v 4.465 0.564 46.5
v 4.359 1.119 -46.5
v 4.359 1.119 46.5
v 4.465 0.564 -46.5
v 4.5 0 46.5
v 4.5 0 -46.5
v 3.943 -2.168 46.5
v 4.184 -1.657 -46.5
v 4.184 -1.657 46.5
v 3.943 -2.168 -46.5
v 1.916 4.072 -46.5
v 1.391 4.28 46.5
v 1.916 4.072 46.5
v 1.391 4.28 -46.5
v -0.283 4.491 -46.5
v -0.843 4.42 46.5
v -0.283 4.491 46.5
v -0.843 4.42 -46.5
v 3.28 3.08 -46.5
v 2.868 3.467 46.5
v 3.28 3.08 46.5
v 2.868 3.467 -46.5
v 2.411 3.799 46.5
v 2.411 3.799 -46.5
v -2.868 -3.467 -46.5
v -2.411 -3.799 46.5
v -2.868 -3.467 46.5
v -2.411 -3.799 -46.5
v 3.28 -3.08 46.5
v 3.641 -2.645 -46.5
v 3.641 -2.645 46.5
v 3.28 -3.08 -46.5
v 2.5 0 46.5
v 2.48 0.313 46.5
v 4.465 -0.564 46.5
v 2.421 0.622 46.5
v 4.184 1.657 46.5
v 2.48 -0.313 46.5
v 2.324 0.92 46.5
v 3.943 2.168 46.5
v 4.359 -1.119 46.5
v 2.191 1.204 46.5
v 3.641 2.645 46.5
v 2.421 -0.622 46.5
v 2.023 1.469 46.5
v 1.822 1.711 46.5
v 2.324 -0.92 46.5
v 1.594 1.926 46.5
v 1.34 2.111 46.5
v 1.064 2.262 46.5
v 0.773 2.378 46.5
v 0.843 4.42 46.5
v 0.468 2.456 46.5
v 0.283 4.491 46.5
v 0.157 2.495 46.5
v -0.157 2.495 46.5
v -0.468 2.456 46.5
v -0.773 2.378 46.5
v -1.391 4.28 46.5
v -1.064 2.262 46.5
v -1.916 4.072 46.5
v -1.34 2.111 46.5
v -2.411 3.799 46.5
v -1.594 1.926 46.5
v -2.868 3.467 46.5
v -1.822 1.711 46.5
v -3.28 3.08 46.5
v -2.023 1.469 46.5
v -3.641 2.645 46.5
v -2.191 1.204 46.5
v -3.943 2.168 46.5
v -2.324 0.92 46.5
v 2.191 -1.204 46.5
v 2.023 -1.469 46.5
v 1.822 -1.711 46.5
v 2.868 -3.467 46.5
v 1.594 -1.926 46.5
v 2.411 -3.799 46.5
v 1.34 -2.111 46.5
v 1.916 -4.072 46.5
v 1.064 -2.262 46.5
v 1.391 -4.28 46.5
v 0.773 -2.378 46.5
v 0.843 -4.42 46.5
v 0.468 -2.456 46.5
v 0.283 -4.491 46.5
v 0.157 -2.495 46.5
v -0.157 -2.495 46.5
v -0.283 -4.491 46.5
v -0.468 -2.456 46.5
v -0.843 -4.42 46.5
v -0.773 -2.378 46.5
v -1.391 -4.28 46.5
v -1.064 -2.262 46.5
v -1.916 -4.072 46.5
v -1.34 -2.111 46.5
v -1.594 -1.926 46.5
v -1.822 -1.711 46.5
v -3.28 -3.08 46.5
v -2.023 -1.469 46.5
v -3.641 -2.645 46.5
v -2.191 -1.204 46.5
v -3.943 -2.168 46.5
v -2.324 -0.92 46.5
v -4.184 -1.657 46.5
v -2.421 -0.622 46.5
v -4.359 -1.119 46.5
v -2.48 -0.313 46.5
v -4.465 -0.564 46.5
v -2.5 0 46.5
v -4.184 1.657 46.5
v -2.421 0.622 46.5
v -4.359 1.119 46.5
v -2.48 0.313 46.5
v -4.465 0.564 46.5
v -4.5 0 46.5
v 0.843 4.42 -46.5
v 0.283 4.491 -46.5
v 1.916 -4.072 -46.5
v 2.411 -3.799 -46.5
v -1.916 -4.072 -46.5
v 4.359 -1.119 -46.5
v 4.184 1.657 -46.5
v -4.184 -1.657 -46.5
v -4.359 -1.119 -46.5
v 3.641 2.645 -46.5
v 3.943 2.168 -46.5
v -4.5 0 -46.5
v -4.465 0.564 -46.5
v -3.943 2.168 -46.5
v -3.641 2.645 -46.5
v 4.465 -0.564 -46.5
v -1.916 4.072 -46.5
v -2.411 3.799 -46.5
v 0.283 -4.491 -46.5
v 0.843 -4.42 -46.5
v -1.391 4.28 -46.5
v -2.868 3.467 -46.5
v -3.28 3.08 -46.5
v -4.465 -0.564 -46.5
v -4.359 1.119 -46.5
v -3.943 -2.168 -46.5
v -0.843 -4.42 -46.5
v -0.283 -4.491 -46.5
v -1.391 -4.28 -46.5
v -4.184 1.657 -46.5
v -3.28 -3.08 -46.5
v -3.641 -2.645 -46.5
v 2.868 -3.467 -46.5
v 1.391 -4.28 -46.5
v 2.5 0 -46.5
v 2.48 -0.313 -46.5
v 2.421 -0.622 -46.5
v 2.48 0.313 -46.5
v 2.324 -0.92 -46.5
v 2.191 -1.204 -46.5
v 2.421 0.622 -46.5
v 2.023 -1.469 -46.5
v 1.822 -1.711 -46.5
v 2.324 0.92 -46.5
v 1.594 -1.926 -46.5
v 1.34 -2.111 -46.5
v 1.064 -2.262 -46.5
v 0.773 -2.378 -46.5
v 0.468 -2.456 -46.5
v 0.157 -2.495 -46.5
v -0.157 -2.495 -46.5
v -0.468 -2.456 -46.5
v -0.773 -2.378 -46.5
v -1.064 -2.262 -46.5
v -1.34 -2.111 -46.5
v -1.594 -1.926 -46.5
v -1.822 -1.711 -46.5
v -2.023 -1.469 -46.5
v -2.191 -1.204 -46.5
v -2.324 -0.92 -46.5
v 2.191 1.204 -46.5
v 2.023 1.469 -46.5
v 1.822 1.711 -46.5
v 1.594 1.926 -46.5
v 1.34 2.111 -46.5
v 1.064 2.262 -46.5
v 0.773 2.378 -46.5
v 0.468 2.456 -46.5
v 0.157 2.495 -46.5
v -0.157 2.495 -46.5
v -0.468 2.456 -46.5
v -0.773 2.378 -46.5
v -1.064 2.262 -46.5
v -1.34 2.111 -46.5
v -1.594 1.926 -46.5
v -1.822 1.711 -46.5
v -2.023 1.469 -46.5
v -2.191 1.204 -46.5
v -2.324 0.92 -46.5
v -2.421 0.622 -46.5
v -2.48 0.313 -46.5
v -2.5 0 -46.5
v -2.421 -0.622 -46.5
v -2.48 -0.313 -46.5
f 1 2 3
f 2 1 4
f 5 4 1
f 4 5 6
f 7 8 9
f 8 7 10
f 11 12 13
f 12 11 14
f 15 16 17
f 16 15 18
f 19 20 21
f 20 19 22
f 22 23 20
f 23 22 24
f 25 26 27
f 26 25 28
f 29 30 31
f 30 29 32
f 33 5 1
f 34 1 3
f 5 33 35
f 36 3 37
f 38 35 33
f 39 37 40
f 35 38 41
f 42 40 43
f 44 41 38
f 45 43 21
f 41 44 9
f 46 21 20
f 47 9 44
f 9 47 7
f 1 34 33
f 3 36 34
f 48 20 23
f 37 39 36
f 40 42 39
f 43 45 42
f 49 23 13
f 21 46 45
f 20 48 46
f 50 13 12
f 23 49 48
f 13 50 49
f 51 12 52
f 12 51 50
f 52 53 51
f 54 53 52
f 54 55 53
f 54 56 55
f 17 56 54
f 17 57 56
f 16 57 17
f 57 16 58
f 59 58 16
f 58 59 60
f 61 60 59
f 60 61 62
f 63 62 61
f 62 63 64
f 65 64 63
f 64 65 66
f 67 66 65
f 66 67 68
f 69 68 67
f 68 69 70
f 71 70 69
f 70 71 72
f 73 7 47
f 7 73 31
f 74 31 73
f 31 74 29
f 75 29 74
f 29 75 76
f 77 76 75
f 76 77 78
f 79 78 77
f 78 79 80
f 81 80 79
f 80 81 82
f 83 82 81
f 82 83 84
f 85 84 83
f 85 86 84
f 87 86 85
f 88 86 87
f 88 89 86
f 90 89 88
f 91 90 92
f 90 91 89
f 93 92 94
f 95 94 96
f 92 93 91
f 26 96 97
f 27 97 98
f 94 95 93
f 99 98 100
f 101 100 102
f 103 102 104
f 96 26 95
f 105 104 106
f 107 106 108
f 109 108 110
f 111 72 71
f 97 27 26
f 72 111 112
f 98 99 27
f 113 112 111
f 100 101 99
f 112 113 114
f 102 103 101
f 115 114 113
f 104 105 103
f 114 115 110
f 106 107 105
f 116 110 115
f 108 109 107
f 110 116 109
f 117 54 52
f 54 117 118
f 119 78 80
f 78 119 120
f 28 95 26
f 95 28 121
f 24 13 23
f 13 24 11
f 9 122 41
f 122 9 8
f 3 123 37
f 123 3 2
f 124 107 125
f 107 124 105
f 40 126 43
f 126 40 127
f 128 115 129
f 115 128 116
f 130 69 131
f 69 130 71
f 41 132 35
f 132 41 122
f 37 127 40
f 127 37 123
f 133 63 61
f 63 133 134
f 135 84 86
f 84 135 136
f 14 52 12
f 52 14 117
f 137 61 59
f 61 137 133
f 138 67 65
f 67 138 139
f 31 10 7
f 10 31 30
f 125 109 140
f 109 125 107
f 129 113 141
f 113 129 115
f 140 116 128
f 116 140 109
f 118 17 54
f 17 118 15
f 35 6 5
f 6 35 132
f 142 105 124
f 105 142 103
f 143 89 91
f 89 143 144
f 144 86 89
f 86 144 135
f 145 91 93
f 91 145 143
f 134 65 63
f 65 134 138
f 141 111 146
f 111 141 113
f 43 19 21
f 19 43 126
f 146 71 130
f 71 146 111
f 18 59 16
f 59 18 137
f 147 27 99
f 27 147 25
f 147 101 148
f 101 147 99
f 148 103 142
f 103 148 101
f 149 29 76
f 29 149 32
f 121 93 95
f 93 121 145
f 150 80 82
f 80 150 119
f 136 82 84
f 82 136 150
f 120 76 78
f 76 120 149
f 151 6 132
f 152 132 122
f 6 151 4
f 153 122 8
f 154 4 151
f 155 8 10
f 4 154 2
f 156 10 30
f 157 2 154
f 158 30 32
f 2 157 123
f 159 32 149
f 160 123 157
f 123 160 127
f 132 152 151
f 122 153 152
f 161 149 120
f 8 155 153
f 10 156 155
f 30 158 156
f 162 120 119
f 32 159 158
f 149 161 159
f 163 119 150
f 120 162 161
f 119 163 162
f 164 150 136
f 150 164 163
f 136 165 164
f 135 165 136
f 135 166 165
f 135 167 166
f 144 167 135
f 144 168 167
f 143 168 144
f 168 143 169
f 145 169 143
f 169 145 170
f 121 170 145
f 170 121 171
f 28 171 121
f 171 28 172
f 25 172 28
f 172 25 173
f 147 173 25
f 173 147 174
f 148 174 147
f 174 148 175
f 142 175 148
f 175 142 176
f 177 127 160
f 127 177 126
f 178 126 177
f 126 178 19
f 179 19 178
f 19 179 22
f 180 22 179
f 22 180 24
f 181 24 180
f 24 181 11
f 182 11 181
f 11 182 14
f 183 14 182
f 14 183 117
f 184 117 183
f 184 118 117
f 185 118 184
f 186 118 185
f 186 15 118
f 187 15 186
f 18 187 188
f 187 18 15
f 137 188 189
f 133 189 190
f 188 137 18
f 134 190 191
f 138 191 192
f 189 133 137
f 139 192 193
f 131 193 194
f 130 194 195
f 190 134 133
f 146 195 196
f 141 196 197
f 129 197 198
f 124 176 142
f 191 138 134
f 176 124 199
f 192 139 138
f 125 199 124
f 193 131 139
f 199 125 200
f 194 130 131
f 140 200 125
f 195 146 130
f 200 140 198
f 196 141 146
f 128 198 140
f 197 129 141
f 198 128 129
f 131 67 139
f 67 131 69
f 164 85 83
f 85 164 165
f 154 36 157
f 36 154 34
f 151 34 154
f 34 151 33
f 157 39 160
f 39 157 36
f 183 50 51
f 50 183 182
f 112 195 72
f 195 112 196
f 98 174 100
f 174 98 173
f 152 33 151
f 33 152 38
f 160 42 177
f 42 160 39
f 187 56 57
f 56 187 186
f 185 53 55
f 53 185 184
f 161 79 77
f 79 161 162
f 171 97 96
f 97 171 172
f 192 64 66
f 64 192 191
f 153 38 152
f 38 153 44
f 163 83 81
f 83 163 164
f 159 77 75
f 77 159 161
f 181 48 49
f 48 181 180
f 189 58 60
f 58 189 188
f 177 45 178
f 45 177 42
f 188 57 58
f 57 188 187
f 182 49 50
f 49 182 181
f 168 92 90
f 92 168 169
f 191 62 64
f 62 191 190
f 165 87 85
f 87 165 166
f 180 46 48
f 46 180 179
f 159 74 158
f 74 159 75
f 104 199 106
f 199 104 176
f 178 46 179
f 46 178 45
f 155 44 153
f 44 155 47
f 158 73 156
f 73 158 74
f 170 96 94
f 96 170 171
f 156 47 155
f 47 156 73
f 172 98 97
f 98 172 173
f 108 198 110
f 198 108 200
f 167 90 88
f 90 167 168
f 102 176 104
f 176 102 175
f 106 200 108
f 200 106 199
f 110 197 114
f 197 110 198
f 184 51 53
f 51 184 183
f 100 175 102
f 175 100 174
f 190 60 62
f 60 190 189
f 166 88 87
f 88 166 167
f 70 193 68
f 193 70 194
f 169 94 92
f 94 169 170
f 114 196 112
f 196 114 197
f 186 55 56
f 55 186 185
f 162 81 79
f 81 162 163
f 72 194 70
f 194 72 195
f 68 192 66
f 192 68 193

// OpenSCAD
$fn = 50;


difference() {
	union() {
		translate(v = [0, 0, -46.5000000000]) {
			cylinder(h = 93, r = 4.5000000000);
		}
	}
	union() {
		translate(v = [0, 0, -100.0000000000]) {
			cylinder(h = 200, r = 2.5000000000);
		}
	}
}
